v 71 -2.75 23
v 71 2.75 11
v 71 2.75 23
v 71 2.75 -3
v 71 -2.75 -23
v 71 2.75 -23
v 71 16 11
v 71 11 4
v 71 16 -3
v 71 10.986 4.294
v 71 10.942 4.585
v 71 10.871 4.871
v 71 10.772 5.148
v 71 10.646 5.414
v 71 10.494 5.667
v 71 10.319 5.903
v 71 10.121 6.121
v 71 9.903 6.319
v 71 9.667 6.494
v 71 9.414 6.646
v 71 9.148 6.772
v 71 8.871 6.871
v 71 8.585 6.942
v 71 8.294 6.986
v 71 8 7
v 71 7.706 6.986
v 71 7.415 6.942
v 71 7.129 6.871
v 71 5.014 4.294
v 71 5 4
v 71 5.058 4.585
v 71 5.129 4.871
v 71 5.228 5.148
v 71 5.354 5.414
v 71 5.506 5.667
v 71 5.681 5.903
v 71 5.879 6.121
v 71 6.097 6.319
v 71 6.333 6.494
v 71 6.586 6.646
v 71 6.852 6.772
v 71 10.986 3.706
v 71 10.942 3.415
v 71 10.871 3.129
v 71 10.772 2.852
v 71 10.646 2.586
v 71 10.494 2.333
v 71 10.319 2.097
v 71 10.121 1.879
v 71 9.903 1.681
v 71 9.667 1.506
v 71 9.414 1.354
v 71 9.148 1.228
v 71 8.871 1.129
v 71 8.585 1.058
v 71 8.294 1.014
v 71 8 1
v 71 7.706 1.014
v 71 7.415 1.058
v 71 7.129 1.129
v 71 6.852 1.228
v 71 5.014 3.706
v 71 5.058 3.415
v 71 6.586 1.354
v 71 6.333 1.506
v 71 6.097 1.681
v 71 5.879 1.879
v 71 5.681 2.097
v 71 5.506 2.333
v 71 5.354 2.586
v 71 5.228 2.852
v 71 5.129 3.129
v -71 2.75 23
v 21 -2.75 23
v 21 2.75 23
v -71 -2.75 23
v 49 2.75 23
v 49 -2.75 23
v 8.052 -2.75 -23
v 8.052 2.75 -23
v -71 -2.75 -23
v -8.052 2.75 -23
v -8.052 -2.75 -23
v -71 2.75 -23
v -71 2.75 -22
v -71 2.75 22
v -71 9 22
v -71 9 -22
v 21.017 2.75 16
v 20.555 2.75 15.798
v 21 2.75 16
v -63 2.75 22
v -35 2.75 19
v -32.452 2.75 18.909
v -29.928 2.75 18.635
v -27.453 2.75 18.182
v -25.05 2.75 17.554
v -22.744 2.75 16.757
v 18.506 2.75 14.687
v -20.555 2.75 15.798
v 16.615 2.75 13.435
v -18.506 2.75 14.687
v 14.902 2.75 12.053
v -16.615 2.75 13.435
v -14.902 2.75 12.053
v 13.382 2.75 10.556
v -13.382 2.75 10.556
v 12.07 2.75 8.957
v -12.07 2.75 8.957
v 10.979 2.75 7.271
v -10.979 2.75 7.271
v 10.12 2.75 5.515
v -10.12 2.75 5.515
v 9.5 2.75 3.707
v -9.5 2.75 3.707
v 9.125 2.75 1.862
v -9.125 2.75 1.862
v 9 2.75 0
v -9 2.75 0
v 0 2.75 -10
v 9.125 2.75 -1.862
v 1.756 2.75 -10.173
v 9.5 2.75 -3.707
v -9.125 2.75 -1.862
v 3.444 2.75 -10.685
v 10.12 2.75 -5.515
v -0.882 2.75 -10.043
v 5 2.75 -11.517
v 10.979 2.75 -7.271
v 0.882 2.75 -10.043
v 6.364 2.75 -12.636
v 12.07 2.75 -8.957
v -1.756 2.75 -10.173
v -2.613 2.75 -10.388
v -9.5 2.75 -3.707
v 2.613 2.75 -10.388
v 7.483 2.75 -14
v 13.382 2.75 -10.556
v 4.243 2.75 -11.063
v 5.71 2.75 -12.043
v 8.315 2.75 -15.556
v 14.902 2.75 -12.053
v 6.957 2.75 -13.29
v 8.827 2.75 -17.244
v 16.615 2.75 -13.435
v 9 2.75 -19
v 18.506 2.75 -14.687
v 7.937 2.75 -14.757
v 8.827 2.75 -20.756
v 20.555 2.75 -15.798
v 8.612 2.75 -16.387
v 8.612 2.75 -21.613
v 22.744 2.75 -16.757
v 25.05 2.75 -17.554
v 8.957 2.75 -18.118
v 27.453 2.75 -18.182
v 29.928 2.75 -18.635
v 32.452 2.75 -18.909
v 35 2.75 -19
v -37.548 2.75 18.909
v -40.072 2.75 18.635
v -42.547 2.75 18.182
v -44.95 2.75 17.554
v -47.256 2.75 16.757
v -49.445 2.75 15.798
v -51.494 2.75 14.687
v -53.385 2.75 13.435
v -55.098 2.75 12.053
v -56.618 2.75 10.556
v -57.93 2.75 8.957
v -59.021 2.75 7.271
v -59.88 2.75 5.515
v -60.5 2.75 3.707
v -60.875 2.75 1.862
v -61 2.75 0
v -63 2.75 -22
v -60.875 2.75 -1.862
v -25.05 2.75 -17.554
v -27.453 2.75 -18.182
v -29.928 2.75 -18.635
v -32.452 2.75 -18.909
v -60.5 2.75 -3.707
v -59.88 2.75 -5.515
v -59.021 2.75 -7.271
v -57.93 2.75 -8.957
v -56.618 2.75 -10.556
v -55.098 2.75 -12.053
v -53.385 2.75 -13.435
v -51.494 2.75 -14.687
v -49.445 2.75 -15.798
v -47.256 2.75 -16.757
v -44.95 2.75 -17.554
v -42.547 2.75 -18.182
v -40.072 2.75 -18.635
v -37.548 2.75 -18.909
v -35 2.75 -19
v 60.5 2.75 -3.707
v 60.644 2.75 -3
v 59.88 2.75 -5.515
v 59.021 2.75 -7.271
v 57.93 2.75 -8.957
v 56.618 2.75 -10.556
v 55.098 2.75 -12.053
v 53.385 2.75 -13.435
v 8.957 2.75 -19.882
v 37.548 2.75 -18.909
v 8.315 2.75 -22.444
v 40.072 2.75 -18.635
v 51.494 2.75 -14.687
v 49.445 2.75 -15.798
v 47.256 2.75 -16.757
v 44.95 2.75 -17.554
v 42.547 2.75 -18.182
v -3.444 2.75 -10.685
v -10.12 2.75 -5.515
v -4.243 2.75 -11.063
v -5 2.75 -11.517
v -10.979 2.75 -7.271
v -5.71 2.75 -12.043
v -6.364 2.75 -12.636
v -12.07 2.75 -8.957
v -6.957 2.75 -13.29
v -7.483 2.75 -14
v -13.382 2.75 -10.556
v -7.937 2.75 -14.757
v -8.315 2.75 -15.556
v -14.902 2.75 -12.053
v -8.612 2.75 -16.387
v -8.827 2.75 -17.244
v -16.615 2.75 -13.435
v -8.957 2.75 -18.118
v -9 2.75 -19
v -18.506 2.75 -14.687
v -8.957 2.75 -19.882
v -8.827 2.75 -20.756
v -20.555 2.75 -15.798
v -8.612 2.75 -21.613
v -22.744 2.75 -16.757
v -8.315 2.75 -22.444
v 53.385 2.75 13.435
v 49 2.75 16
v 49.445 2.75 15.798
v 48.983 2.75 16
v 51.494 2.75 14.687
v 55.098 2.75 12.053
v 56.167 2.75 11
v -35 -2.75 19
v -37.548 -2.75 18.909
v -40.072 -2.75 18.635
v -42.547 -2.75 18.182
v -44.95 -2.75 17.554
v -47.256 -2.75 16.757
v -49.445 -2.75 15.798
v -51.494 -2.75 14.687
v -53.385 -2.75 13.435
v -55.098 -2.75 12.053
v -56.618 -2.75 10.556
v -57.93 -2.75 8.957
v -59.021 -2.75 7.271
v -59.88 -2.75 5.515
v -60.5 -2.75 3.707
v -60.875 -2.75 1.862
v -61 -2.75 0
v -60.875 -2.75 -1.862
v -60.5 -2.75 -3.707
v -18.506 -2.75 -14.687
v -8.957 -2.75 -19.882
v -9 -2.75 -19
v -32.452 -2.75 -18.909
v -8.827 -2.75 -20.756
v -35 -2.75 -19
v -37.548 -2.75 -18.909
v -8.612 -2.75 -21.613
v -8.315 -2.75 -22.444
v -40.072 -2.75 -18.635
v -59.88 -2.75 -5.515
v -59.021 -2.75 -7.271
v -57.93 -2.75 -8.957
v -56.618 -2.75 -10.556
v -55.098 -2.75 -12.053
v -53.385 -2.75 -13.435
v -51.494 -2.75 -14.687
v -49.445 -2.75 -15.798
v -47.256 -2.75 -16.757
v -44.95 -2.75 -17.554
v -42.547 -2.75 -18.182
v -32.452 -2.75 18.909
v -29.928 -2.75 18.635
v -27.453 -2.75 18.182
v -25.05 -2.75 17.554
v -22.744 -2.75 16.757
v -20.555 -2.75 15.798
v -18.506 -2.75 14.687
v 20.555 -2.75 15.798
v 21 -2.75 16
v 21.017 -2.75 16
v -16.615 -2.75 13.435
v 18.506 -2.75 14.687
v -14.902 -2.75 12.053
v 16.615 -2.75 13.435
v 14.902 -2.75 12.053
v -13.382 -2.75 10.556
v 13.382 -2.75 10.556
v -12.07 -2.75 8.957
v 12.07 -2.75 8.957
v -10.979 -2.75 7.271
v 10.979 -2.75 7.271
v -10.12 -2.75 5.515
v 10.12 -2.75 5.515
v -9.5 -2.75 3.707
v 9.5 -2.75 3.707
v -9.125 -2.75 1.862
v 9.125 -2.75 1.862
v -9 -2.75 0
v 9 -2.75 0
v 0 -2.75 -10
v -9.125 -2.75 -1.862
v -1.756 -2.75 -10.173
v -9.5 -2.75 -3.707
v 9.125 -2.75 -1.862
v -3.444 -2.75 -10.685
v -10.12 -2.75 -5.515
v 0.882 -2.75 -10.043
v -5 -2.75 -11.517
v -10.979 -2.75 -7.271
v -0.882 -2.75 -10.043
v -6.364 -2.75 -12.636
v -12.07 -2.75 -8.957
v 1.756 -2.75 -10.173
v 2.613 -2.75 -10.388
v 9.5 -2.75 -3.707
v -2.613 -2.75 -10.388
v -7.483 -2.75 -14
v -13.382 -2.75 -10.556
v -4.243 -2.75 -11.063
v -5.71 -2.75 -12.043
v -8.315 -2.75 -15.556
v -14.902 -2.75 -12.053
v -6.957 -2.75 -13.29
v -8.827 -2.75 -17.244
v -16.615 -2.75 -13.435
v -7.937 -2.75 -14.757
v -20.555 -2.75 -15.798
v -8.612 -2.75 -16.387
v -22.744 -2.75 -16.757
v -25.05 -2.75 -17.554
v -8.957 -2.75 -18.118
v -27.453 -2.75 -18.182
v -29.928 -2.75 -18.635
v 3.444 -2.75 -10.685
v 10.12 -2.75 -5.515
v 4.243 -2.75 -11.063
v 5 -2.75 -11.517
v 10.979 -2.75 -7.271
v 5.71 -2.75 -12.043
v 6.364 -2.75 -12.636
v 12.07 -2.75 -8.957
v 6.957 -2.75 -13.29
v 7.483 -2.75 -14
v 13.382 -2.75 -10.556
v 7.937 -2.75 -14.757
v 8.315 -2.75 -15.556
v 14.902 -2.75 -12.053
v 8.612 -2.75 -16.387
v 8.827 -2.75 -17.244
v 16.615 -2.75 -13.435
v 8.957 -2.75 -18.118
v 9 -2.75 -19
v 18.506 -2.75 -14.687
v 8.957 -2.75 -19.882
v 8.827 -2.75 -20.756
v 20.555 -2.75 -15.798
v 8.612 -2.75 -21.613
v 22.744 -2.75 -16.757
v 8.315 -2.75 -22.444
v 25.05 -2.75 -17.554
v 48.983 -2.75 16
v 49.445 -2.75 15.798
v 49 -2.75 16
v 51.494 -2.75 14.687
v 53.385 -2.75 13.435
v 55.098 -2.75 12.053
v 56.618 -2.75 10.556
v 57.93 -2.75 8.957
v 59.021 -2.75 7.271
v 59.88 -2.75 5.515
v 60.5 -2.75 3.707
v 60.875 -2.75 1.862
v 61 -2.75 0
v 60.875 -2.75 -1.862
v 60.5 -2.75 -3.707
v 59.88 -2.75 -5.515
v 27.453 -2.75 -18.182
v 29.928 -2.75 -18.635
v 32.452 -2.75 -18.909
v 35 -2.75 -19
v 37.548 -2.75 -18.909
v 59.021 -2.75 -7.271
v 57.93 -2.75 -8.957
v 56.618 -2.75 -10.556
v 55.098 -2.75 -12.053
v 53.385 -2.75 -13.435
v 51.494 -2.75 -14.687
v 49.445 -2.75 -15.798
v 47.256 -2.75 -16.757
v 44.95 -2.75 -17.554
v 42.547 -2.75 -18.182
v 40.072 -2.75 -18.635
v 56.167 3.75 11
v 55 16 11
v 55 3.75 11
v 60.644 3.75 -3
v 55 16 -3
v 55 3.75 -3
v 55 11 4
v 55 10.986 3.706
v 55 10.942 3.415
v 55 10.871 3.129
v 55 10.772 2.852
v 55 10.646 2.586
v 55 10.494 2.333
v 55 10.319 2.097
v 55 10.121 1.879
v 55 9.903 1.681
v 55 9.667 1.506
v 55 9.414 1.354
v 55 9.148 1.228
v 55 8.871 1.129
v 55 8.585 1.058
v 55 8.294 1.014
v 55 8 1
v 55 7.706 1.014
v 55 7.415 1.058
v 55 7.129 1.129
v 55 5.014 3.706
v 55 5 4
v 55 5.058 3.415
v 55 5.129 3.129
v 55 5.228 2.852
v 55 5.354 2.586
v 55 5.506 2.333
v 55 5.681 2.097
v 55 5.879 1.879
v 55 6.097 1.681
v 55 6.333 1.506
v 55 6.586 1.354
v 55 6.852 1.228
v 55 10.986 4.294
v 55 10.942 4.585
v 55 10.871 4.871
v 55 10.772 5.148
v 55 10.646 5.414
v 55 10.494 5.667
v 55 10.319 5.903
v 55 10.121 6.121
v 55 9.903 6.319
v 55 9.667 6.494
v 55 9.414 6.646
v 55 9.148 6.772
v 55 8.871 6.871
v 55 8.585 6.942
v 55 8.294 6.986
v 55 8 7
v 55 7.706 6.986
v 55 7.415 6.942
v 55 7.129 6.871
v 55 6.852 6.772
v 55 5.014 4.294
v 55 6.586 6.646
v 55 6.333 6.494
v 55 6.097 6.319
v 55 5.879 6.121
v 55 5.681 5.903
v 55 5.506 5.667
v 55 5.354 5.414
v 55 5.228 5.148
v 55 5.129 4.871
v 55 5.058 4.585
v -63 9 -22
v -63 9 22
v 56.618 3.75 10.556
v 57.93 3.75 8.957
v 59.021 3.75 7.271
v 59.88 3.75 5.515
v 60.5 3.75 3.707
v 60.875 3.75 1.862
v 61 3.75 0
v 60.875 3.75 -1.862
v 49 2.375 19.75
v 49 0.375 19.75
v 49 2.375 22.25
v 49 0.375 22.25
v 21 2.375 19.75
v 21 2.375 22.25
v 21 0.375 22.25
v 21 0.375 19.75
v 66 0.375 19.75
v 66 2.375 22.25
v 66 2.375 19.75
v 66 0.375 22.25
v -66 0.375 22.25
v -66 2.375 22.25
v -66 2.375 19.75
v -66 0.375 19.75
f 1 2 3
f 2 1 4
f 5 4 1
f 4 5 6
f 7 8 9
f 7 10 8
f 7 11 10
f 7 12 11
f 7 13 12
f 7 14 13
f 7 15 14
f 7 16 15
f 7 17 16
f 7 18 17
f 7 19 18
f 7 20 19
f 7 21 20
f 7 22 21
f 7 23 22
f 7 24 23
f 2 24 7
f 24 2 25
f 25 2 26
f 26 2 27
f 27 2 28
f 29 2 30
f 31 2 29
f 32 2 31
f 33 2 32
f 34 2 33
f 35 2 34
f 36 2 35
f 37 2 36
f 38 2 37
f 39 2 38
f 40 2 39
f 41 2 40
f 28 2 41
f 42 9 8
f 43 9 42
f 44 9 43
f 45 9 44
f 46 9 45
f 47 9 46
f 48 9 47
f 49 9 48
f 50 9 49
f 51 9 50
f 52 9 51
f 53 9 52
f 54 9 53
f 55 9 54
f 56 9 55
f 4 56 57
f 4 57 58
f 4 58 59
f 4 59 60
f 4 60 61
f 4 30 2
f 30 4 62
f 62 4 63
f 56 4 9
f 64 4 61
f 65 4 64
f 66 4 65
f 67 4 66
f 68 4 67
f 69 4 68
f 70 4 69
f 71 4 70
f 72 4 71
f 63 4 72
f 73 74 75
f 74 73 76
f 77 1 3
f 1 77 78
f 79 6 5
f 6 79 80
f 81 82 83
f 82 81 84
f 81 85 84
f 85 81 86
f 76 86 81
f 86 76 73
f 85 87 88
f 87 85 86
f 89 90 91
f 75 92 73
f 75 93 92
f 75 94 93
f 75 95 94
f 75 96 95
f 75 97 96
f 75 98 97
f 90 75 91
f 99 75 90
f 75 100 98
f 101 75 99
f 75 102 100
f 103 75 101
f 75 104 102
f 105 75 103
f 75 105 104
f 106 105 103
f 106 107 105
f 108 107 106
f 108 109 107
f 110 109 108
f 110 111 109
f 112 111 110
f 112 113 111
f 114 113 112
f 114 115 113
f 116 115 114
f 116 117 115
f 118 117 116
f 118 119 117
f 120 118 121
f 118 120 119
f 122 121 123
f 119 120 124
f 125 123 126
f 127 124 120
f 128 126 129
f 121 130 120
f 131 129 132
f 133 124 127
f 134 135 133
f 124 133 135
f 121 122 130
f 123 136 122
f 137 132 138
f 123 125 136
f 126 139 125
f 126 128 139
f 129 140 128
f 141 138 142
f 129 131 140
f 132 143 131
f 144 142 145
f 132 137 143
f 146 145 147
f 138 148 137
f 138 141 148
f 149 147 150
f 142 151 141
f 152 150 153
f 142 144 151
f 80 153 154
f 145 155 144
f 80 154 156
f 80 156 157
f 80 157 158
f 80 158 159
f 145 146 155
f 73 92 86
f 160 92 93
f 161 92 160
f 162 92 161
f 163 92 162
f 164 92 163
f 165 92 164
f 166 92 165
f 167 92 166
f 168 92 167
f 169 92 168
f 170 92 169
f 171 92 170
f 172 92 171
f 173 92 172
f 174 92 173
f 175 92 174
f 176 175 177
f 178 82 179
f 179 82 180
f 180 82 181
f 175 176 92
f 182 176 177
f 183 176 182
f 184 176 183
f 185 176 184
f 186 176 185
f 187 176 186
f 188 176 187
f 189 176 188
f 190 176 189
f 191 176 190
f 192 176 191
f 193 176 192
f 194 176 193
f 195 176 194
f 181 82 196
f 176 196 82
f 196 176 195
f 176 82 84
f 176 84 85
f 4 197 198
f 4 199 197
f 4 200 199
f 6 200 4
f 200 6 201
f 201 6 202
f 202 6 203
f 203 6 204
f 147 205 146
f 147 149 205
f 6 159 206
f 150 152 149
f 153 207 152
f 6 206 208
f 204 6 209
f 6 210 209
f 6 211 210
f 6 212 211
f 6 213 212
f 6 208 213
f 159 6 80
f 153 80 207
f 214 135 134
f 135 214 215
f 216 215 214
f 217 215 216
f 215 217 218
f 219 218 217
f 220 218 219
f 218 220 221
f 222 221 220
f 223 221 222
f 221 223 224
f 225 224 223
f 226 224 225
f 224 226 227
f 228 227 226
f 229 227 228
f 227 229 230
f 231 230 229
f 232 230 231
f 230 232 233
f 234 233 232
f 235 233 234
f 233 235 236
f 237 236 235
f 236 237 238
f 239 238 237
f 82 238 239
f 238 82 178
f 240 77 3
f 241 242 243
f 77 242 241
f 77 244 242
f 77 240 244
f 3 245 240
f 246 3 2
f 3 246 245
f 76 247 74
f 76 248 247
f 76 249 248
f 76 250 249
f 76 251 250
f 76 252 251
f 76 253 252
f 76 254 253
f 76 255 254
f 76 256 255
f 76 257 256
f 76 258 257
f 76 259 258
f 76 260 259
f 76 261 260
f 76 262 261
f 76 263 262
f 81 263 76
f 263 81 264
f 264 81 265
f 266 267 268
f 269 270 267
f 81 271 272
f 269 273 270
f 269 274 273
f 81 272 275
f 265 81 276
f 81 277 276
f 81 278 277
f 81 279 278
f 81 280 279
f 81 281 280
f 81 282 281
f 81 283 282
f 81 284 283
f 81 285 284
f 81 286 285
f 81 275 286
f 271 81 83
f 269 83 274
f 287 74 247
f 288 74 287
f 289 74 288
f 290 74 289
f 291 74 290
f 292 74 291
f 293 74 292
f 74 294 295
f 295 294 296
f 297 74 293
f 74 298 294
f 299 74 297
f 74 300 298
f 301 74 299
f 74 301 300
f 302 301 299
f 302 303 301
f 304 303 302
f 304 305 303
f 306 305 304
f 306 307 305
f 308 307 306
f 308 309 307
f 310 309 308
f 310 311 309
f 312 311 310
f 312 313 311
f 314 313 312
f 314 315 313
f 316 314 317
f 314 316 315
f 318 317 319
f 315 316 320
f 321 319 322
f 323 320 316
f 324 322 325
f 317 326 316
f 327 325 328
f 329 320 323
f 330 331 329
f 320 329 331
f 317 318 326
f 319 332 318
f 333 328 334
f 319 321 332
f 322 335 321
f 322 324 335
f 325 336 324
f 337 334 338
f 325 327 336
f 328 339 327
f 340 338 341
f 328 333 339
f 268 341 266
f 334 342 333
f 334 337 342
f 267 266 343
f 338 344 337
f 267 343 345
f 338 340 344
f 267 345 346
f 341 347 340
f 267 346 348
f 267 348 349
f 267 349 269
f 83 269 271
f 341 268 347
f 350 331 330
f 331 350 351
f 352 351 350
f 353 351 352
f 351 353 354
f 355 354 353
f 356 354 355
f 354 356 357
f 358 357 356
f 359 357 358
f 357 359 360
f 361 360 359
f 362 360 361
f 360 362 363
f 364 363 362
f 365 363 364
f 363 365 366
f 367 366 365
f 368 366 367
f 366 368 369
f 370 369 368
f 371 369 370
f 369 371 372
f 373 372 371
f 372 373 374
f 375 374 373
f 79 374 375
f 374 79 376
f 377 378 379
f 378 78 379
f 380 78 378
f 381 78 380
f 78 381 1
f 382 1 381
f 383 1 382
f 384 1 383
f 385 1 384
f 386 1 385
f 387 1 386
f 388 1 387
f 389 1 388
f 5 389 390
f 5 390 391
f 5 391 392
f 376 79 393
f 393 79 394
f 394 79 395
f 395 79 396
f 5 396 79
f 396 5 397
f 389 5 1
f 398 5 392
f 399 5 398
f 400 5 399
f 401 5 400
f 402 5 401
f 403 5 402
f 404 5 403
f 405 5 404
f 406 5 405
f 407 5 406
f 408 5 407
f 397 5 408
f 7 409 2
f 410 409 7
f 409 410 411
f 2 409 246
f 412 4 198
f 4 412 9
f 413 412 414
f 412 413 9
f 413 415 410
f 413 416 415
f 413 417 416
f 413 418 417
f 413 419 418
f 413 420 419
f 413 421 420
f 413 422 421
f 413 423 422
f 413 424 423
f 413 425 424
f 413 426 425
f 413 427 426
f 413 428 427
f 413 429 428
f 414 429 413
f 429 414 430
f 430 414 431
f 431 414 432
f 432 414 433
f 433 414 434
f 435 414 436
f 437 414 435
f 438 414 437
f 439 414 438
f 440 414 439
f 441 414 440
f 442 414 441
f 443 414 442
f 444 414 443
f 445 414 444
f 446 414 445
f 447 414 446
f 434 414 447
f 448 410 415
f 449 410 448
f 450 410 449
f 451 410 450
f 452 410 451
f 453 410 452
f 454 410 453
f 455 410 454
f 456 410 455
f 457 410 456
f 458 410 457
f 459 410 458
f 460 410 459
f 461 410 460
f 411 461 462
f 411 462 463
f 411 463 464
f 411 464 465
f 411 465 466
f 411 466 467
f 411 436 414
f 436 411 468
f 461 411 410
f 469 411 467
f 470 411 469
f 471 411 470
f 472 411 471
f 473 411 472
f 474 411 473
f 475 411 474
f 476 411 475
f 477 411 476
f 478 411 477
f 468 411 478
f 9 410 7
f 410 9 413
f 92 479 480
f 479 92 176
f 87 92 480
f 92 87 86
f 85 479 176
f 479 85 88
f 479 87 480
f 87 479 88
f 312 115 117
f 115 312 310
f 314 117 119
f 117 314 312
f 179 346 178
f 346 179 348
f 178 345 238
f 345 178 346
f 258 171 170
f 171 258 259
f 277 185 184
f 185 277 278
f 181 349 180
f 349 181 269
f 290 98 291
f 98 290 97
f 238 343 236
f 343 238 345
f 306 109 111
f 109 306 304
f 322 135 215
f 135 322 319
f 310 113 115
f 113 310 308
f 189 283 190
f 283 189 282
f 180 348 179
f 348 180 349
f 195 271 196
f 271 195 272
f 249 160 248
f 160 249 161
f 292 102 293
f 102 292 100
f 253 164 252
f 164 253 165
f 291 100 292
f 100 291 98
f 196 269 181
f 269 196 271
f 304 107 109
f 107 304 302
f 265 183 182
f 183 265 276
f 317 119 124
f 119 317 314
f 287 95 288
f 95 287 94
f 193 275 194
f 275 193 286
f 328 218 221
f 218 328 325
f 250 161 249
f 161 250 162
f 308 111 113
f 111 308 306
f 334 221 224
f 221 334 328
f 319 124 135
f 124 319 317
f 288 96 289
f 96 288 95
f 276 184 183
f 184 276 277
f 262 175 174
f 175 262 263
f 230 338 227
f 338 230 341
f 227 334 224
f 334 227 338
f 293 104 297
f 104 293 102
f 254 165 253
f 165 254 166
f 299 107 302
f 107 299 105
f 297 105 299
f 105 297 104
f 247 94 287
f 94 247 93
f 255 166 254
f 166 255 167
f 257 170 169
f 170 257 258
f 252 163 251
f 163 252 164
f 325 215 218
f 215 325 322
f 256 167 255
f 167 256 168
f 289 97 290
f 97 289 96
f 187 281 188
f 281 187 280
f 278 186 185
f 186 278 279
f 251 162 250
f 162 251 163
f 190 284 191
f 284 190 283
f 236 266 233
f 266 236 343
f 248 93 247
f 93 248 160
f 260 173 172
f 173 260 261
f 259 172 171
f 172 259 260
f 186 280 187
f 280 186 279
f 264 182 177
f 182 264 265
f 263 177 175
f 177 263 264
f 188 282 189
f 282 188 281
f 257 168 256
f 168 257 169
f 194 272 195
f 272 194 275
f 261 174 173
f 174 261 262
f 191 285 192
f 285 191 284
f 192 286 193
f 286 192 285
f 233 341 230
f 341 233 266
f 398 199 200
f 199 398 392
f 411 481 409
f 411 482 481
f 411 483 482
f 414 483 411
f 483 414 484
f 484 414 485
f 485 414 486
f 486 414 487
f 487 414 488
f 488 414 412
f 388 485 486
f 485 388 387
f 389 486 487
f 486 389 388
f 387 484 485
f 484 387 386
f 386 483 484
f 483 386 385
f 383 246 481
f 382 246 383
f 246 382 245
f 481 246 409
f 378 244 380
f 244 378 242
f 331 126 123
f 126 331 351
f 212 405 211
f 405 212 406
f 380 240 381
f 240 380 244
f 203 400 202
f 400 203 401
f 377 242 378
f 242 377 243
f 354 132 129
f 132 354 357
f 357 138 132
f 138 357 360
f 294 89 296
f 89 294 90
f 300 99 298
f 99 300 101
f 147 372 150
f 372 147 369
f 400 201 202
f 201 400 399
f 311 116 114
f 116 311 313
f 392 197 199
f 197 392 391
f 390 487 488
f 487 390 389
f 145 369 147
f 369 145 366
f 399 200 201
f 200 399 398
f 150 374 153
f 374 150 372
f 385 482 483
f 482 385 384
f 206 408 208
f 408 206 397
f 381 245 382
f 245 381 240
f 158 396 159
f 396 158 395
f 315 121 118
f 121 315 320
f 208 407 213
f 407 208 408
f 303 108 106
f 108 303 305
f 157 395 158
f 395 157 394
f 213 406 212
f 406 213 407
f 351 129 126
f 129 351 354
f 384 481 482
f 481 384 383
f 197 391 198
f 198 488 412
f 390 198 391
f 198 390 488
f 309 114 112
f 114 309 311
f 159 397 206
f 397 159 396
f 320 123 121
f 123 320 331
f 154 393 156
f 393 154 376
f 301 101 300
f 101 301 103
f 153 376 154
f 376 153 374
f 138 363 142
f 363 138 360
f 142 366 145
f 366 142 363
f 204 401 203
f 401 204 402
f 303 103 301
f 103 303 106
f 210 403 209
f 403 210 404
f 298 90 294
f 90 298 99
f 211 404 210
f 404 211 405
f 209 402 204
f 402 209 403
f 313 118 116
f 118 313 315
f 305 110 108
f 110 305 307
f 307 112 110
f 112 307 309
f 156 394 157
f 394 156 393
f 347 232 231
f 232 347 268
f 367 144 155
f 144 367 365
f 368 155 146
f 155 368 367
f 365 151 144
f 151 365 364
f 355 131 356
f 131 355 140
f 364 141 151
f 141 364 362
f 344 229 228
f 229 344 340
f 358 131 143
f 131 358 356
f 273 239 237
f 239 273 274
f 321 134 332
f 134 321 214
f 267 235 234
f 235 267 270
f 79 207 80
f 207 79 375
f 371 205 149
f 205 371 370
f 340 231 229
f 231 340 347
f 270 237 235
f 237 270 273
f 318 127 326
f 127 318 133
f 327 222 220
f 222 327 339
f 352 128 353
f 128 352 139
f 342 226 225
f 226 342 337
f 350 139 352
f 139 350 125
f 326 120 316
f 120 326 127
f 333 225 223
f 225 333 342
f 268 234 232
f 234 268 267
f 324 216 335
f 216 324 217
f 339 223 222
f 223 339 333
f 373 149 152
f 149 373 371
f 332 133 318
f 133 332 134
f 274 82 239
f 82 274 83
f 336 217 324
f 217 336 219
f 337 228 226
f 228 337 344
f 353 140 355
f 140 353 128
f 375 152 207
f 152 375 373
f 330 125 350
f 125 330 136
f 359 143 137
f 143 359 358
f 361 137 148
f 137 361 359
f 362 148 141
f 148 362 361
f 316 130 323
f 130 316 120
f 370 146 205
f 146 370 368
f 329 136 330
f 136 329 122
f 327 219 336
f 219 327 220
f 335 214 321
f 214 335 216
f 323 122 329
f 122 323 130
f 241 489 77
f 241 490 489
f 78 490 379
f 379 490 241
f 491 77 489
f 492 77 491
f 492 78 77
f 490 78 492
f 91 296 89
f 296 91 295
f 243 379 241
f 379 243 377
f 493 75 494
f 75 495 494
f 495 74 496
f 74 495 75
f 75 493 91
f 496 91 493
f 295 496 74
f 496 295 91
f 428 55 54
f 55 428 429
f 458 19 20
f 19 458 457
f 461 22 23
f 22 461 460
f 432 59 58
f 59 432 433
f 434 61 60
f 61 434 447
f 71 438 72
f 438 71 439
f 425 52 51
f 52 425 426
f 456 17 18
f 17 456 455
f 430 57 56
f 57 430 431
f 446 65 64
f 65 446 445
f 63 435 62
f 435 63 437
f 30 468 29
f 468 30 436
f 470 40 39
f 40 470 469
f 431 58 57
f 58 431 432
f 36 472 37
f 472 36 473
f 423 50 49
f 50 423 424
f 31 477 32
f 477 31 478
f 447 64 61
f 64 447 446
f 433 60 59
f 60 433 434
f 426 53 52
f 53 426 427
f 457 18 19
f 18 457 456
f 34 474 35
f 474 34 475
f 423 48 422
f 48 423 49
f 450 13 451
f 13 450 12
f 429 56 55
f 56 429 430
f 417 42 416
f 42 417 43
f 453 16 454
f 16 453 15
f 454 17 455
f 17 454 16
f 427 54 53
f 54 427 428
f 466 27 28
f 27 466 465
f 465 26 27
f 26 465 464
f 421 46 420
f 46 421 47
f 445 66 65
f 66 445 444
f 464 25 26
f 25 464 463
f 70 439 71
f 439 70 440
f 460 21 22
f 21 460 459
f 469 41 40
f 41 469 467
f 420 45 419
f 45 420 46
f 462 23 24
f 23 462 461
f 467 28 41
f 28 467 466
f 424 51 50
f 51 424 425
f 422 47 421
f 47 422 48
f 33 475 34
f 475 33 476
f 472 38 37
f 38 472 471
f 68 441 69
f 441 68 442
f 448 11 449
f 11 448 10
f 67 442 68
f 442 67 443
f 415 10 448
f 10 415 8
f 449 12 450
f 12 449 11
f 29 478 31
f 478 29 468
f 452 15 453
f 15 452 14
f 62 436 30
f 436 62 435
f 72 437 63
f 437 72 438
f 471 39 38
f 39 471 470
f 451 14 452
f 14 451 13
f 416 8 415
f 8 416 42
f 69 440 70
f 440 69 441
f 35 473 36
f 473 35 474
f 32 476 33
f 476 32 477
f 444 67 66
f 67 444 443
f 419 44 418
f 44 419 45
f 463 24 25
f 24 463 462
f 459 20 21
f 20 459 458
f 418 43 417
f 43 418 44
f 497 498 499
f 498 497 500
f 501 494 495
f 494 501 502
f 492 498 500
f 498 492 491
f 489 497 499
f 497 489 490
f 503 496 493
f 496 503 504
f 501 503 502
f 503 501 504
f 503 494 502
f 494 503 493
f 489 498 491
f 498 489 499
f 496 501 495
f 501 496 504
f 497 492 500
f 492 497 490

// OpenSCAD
// Guardian X-1: Ultra-Light Titanium-Polymer Hybrid Smart Glasses Frame
// Features integrated side temple arm hinges, waveguide optic housing bay, and micro-stepper motor mount.

$fn = 64;

// Frame Dimensions
frame_width = 142.0;
bridge_gap = 18.0;
lens_width = 52.0;
lens_height = 38.0;
frame_thickness = 5.5;

// Motorized Pop-Up Optic Bay Cavity
optic_bay_width = 28.0;
optic_bay_depth = 8.0;
stepper_mount_dia = 6.0;

module glasses_frame() {
    difference() {
        union() {
            // Main Eyewear Front Frame Chassis
            translate([0, 0, 0])
                cube([frame_width, frame_thickness, lens_height + 8], center = true);
            
            // Right Temple Motor & Gear Box Enclosure
            translate([(frame_width/2) - 8, 8, 4])
                cube([16, 16, 14], center = true);

            // Left Temple Arm Hinge Mount
            translate([-(frame_width/2) + 4, 4, 0])
                cube([8, 10, lens_height + 6], center = true);
        }

        // Left Eye Lens Cutout
        translate([-(bridge_gap/2 + lens_width/2), 0, 0])
            rotate([90, 0, 0])
                scale([lens_width / 2, lens_height / 2, 1])
                    cylinder(h = frame_thickness + 2, r = 1.0, center = true);

        // Right Eye Lens Cutout
        translate([(bridge_gap/2 + lens_width/2), 0, 0])
            rotate([90, 0, 0])
                scale([lens_width / 2, lens_height / 2, 1])
                    cylinder(h = frame_thickness + 2, r = 1.0, center = true);

        // Center Nose Bridge Relief Arc
        translate([0, 0, -(lens_height/2)])
            rotate([90, 0, 0])
                cylinder(h = frame_thickness + 2, d = bridge_gap, center = true);

        // Motorized Waveguide Pop-Up Slide Track (Right Brow Section)
        translate([(bridge_gap/2 + lens_width/2), 0, (lens_height/2) + 1])
            cube([optic_bay_width, frame_thickness + 4, optic_bay_depth], center = true);

        // Micro-Stepper Drive Shaft Bore
        translate([(frame_width/2) - 8, 8, 4])
            rotate([0, 90, 0])
                cylinder(h = 20, d = stepper_mount_dia, center = true);

        // Internal Ribbon Cable Wire Routing Channels
        translate([0, frame_thickness/4, (lens_height/2) + 2])
            cube([frame_width - 10, 2.0, 2.5], center = true);
    }
}

glasses_frame();
